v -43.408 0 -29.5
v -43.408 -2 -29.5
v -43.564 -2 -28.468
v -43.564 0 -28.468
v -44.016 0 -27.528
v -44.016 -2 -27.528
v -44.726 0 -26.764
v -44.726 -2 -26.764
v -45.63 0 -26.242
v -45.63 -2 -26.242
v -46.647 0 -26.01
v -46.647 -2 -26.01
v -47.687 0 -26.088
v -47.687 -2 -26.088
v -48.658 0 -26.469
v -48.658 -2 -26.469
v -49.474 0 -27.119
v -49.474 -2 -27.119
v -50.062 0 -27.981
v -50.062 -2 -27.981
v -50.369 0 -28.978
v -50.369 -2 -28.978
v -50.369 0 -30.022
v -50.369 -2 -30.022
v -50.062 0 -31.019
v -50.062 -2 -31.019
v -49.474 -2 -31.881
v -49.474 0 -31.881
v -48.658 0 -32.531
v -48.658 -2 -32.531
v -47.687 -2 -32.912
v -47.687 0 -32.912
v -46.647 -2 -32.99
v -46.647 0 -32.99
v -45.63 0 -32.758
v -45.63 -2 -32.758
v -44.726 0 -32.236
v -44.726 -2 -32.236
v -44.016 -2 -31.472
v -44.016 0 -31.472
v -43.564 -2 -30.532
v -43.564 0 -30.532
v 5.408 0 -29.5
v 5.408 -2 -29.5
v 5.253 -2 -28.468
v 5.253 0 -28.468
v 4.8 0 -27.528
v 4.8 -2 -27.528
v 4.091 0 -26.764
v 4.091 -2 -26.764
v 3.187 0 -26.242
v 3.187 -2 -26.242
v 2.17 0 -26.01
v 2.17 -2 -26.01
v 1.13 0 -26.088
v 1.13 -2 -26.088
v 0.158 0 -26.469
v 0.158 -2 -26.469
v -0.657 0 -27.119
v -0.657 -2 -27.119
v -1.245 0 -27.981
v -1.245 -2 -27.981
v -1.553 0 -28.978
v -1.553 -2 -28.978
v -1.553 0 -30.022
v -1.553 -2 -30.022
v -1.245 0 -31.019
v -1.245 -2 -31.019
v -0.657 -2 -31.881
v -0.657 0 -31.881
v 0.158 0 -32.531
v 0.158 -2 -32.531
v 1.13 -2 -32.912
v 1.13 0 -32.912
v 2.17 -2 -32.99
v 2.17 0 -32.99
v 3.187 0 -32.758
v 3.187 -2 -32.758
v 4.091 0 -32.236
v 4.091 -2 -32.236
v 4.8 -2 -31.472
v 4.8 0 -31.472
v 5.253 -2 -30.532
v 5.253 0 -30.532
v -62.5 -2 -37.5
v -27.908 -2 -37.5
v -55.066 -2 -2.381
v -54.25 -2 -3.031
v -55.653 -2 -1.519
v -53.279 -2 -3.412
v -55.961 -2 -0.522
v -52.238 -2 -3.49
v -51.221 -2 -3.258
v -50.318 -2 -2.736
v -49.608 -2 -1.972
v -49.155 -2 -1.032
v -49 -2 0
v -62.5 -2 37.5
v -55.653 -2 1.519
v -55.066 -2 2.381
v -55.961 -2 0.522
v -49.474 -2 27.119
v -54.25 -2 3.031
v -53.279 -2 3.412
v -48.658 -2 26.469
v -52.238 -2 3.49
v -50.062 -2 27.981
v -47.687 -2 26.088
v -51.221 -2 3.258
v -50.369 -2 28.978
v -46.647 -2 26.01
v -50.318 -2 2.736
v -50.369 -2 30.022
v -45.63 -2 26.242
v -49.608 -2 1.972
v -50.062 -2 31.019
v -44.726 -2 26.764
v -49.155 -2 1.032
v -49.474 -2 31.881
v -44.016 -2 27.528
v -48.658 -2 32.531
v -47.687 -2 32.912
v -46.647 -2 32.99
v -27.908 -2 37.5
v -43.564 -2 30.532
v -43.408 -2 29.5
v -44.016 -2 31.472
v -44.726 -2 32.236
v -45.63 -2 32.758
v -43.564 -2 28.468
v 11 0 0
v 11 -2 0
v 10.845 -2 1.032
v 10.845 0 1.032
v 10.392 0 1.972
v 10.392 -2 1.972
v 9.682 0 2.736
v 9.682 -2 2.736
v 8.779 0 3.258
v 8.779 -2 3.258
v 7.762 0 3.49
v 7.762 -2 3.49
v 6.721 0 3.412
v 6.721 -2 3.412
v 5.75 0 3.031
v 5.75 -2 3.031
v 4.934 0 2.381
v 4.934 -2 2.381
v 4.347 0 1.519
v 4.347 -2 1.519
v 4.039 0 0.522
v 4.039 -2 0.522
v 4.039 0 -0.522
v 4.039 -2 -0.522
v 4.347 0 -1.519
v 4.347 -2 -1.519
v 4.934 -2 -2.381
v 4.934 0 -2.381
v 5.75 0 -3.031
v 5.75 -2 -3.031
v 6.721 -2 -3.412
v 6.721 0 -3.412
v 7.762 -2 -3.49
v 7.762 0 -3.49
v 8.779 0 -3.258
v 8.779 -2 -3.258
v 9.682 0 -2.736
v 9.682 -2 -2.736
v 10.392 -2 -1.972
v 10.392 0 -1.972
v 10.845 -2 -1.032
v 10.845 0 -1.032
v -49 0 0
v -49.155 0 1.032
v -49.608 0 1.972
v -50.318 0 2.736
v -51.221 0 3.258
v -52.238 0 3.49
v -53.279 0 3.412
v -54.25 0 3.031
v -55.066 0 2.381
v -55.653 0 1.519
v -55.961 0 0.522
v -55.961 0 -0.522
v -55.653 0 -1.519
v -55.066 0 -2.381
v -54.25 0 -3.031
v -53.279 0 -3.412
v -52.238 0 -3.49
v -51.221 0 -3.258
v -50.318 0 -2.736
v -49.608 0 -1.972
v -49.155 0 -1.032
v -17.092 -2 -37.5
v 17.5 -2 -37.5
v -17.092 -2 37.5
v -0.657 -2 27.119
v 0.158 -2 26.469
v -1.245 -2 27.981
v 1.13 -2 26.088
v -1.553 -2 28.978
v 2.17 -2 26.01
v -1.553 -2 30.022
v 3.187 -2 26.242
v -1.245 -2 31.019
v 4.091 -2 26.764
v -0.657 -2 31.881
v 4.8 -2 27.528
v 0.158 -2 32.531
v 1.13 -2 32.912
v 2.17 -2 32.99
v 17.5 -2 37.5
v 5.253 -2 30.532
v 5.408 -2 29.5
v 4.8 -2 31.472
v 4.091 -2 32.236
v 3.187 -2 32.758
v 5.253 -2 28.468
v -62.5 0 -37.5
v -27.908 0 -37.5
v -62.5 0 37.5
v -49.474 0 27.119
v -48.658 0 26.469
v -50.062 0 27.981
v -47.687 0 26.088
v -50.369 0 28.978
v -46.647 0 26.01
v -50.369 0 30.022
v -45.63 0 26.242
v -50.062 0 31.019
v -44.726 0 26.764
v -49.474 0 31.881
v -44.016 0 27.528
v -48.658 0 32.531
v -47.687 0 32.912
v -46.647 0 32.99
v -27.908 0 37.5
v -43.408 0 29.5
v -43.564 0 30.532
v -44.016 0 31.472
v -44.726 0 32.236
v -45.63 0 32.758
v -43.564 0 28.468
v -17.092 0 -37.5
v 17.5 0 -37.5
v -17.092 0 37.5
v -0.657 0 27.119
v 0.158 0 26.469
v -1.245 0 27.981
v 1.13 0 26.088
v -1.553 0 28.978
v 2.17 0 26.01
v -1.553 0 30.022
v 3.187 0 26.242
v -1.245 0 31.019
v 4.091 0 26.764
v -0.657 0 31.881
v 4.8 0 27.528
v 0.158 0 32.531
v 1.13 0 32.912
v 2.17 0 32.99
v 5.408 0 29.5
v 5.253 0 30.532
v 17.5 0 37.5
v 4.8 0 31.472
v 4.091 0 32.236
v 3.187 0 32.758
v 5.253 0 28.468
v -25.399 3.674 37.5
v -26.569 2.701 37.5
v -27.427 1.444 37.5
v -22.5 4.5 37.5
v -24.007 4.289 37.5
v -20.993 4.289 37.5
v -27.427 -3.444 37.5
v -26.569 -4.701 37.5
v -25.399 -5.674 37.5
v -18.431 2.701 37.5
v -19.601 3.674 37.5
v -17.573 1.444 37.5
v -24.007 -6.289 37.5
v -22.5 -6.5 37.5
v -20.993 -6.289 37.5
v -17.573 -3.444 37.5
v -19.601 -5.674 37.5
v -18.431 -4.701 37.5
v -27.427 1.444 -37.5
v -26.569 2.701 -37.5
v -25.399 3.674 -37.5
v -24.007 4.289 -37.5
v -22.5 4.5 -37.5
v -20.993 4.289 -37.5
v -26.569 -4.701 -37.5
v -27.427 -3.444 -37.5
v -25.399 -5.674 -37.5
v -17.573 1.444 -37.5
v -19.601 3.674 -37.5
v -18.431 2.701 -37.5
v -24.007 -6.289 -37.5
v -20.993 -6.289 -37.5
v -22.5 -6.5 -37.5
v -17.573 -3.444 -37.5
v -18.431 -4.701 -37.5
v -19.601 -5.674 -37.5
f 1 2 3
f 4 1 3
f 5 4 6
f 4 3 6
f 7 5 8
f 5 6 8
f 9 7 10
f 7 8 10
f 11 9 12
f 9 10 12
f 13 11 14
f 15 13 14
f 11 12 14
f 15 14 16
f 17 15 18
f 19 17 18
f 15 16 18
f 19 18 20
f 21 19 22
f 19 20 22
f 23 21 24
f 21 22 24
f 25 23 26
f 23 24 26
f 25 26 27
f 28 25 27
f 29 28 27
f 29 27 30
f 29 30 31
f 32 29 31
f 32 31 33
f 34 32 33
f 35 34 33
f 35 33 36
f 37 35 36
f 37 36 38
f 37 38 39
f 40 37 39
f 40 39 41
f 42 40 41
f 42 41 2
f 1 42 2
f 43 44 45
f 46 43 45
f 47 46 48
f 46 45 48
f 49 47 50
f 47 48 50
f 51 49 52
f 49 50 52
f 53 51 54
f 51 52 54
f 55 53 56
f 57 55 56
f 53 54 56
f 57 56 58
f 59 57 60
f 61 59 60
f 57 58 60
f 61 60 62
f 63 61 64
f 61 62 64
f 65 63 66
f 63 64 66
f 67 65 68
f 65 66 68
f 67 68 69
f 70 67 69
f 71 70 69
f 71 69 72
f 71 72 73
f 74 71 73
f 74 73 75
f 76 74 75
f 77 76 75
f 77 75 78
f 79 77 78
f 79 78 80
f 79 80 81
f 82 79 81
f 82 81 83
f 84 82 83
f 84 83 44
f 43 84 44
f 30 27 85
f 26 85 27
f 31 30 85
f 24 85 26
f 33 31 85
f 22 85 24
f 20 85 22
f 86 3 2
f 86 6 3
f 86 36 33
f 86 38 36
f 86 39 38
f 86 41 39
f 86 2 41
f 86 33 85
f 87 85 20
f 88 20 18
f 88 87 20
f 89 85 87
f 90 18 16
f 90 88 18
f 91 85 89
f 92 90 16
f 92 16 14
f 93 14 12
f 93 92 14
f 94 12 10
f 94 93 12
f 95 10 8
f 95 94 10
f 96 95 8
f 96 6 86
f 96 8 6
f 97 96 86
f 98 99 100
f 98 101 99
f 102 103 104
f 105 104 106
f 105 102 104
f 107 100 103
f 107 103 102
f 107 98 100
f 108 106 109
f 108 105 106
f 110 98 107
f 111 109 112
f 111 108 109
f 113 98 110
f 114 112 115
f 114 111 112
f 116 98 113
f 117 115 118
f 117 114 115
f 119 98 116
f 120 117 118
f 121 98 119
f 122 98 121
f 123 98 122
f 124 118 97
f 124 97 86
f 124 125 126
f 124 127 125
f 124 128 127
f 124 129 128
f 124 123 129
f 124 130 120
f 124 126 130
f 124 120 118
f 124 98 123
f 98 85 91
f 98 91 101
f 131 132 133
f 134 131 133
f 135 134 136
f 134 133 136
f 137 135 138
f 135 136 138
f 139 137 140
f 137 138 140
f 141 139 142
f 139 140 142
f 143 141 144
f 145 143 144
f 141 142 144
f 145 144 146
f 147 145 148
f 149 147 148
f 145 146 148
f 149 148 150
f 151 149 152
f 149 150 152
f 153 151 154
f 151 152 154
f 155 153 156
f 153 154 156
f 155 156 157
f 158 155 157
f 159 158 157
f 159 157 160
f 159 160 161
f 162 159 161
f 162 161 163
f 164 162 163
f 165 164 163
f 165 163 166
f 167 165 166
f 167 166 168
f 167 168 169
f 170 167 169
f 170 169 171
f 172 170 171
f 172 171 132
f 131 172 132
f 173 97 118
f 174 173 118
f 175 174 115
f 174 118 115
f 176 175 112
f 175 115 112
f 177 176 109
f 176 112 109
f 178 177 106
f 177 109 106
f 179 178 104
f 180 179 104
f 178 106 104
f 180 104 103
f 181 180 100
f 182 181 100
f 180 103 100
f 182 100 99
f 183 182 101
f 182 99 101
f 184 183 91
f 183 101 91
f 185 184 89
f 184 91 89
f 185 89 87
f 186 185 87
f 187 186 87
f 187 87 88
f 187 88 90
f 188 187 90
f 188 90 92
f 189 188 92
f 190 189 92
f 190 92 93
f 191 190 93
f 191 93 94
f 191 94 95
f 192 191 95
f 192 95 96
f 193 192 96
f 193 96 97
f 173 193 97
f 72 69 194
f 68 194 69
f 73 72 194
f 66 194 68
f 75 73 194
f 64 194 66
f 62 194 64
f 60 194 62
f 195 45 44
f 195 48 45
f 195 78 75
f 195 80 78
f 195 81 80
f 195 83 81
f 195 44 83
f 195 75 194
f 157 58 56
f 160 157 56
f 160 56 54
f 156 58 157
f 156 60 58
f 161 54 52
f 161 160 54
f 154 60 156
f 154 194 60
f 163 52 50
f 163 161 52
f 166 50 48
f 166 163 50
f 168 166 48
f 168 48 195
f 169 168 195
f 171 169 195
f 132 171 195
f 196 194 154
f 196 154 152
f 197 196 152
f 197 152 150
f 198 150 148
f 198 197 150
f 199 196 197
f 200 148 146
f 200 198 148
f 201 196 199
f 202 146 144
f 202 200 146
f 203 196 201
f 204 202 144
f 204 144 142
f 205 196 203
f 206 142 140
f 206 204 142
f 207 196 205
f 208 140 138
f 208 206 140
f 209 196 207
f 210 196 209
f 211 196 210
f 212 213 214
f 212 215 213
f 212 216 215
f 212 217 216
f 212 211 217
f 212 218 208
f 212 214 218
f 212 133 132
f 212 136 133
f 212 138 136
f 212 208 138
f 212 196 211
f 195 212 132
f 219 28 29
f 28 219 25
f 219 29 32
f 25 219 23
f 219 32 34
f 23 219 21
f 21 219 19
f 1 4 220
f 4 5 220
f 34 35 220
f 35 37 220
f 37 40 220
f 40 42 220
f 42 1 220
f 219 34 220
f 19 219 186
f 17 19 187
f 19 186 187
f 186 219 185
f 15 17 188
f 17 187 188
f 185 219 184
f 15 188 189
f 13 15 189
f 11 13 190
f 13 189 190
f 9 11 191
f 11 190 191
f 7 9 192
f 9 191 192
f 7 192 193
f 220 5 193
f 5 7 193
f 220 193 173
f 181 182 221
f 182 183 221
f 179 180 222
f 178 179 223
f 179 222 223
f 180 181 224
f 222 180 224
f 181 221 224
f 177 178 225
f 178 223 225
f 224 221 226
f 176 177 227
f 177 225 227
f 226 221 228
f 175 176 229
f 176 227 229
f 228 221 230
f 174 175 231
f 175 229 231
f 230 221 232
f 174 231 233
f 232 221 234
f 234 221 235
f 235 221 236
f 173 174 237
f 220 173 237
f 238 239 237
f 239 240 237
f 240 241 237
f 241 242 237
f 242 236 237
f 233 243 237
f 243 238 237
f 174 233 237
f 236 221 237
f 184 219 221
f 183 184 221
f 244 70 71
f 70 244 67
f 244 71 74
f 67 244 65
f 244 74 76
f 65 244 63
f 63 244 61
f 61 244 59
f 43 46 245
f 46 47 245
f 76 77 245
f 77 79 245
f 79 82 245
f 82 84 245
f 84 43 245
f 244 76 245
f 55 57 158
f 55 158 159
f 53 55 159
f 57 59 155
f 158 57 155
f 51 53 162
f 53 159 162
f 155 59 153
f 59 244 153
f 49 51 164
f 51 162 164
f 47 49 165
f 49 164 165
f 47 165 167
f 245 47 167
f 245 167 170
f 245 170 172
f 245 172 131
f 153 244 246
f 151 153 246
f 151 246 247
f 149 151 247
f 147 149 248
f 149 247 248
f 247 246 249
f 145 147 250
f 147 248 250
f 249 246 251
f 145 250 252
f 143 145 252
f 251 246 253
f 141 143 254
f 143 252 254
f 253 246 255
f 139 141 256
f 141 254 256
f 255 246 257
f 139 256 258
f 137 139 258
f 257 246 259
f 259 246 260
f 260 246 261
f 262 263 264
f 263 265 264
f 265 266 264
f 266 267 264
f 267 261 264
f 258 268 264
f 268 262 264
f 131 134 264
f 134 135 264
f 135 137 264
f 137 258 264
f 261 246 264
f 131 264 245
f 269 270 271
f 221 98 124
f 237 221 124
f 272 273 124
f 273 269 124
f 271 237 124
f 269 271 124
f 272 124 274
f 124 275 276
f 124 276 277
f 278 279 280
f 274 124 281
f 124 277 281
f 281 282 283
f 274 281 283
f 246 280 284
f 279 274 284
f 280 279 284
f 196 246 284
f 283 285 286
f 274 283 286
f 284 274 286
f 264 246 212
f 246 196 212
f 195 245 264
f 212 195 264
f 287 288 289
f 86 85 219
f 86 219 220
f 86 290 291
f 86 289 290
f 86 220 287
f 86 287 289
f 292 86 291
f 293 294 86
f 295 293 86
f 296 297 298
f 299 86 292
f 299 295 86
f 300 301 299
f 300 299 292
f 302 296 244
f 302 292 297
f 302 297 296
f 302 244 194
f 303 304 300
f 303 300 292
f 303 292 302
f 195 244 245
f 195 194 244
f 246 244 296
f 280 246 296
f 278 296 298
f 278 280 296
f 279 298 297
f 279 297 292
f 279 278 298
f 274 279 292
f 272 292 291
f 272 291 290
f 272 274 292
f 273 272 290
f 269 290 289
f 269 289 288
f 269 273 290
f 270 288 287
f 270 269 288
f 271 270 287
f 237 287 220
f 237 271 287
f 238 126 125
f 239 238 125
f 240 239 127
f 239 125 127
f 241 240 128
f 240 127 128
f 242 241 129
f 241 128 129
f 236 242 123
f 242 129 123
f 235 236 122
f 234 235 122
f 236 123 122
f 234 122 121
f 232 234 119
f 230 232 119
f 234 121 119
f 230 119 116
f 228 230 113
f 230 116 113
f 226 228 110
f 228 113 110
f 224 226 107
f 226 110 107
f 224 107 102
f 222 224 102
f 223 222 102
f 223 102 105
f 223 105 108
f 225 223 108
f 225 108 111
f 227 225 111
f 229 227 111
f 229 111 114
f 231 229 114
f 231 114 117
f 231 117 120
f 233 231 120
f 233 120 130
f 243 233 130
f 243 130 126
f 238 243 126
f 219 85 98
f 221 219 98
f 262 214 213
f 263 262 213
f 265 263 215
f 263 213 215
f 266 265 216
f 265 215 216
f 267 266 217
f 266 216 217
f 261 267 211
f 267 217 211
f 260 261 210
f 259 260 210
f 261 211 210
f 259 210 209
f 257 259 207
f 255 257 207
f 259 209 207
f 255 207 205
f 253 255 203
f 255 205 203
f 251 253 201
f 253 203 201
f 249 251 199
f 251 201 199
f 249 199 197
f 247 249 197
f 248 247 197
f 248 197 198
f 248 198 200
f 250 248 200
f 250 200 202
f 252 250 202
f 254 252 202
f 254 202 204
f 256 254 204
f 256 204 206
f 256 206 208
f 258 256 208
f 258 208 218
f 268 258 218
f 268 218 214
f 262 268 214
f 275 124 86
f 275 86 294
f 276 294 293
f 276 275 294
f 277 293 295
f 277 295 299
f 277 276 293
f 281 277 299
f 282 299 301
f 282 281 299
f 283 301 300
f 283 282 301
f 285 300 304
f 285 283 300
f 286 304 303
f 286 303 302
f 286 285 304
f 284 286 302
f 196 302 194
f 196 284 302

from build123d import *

# Parameters (mm, degrees)
F0_W      = 35
F0_H      = 75
F1_DEPTH  = 2
F2_R      = 5.5
F3_DEPTH  = 75
F4_W      = 35
F4_H      = 75
F5_DEPTH  = 2
F7_R      = 3.5
F8_DEPTH  = 6.501
F9_R      = 3.5
F10_DEPTH = 6.501


with BuildPart() as f1:
    # F0 (on Front) → F1 (new body)
    with BuildSketch(Plane.XZ):
        Rectangle(F0_W, F0_H)
    extrude(amount=F1_DEPTH)


with BuildPart() as f3:
    # F2 (on face) → F3 (new body)
    with BuildSketch(Plane.XY.offset(37.5)):
        with Locations((-22.5, -1)):
            Circle(F2_R)
    extrude(amount=-F3_DEPTH)


with BuildPart() as f5:
    # F4 (on face) → F5 (new body)
    with BuildSketch(Plane.XZ.offset(2)):
        with Locations((-45, 0)):
            Rectangle(F4_W, F4_H)
    extrude(amount=-F5_DEPTH)


with BuildPart() as f1_1:
    add(f1.part)

    # F6: union F3, F5
    add(f3.part)
    add(f5.part)

    # F7 (on face) → F8 (cut, through all)
    with BuildSketch(Plane.XZ.offset(2)):
        with Locations((1.908327, -29.5)):
            Circle(F7_R)
        with Locations((1.908327, 29.5)):
            Circle(F7_R)
        with Locations((7.5, 0)):
            Circle(F7_R)
    extrude(amount=-F8_DEPTH, mode=Mode.SUBTRACT)

    # F9 (on face) → F10 (cut, through all)
    with BuildSketch(Plane.XZ.offset(2)):
        with Locations((-46.908327, -29.5)):
            Circle(F9_R)
        with Locations((-46.908327, 29.5)):
            Circle(F9_R)
        with Locations((-52.5, 0)):
            Circle(F9_R)
    extrude(amount=-F10_DEPTH, mode=Mode.SUBTRACT)


solid = f1_1.part
